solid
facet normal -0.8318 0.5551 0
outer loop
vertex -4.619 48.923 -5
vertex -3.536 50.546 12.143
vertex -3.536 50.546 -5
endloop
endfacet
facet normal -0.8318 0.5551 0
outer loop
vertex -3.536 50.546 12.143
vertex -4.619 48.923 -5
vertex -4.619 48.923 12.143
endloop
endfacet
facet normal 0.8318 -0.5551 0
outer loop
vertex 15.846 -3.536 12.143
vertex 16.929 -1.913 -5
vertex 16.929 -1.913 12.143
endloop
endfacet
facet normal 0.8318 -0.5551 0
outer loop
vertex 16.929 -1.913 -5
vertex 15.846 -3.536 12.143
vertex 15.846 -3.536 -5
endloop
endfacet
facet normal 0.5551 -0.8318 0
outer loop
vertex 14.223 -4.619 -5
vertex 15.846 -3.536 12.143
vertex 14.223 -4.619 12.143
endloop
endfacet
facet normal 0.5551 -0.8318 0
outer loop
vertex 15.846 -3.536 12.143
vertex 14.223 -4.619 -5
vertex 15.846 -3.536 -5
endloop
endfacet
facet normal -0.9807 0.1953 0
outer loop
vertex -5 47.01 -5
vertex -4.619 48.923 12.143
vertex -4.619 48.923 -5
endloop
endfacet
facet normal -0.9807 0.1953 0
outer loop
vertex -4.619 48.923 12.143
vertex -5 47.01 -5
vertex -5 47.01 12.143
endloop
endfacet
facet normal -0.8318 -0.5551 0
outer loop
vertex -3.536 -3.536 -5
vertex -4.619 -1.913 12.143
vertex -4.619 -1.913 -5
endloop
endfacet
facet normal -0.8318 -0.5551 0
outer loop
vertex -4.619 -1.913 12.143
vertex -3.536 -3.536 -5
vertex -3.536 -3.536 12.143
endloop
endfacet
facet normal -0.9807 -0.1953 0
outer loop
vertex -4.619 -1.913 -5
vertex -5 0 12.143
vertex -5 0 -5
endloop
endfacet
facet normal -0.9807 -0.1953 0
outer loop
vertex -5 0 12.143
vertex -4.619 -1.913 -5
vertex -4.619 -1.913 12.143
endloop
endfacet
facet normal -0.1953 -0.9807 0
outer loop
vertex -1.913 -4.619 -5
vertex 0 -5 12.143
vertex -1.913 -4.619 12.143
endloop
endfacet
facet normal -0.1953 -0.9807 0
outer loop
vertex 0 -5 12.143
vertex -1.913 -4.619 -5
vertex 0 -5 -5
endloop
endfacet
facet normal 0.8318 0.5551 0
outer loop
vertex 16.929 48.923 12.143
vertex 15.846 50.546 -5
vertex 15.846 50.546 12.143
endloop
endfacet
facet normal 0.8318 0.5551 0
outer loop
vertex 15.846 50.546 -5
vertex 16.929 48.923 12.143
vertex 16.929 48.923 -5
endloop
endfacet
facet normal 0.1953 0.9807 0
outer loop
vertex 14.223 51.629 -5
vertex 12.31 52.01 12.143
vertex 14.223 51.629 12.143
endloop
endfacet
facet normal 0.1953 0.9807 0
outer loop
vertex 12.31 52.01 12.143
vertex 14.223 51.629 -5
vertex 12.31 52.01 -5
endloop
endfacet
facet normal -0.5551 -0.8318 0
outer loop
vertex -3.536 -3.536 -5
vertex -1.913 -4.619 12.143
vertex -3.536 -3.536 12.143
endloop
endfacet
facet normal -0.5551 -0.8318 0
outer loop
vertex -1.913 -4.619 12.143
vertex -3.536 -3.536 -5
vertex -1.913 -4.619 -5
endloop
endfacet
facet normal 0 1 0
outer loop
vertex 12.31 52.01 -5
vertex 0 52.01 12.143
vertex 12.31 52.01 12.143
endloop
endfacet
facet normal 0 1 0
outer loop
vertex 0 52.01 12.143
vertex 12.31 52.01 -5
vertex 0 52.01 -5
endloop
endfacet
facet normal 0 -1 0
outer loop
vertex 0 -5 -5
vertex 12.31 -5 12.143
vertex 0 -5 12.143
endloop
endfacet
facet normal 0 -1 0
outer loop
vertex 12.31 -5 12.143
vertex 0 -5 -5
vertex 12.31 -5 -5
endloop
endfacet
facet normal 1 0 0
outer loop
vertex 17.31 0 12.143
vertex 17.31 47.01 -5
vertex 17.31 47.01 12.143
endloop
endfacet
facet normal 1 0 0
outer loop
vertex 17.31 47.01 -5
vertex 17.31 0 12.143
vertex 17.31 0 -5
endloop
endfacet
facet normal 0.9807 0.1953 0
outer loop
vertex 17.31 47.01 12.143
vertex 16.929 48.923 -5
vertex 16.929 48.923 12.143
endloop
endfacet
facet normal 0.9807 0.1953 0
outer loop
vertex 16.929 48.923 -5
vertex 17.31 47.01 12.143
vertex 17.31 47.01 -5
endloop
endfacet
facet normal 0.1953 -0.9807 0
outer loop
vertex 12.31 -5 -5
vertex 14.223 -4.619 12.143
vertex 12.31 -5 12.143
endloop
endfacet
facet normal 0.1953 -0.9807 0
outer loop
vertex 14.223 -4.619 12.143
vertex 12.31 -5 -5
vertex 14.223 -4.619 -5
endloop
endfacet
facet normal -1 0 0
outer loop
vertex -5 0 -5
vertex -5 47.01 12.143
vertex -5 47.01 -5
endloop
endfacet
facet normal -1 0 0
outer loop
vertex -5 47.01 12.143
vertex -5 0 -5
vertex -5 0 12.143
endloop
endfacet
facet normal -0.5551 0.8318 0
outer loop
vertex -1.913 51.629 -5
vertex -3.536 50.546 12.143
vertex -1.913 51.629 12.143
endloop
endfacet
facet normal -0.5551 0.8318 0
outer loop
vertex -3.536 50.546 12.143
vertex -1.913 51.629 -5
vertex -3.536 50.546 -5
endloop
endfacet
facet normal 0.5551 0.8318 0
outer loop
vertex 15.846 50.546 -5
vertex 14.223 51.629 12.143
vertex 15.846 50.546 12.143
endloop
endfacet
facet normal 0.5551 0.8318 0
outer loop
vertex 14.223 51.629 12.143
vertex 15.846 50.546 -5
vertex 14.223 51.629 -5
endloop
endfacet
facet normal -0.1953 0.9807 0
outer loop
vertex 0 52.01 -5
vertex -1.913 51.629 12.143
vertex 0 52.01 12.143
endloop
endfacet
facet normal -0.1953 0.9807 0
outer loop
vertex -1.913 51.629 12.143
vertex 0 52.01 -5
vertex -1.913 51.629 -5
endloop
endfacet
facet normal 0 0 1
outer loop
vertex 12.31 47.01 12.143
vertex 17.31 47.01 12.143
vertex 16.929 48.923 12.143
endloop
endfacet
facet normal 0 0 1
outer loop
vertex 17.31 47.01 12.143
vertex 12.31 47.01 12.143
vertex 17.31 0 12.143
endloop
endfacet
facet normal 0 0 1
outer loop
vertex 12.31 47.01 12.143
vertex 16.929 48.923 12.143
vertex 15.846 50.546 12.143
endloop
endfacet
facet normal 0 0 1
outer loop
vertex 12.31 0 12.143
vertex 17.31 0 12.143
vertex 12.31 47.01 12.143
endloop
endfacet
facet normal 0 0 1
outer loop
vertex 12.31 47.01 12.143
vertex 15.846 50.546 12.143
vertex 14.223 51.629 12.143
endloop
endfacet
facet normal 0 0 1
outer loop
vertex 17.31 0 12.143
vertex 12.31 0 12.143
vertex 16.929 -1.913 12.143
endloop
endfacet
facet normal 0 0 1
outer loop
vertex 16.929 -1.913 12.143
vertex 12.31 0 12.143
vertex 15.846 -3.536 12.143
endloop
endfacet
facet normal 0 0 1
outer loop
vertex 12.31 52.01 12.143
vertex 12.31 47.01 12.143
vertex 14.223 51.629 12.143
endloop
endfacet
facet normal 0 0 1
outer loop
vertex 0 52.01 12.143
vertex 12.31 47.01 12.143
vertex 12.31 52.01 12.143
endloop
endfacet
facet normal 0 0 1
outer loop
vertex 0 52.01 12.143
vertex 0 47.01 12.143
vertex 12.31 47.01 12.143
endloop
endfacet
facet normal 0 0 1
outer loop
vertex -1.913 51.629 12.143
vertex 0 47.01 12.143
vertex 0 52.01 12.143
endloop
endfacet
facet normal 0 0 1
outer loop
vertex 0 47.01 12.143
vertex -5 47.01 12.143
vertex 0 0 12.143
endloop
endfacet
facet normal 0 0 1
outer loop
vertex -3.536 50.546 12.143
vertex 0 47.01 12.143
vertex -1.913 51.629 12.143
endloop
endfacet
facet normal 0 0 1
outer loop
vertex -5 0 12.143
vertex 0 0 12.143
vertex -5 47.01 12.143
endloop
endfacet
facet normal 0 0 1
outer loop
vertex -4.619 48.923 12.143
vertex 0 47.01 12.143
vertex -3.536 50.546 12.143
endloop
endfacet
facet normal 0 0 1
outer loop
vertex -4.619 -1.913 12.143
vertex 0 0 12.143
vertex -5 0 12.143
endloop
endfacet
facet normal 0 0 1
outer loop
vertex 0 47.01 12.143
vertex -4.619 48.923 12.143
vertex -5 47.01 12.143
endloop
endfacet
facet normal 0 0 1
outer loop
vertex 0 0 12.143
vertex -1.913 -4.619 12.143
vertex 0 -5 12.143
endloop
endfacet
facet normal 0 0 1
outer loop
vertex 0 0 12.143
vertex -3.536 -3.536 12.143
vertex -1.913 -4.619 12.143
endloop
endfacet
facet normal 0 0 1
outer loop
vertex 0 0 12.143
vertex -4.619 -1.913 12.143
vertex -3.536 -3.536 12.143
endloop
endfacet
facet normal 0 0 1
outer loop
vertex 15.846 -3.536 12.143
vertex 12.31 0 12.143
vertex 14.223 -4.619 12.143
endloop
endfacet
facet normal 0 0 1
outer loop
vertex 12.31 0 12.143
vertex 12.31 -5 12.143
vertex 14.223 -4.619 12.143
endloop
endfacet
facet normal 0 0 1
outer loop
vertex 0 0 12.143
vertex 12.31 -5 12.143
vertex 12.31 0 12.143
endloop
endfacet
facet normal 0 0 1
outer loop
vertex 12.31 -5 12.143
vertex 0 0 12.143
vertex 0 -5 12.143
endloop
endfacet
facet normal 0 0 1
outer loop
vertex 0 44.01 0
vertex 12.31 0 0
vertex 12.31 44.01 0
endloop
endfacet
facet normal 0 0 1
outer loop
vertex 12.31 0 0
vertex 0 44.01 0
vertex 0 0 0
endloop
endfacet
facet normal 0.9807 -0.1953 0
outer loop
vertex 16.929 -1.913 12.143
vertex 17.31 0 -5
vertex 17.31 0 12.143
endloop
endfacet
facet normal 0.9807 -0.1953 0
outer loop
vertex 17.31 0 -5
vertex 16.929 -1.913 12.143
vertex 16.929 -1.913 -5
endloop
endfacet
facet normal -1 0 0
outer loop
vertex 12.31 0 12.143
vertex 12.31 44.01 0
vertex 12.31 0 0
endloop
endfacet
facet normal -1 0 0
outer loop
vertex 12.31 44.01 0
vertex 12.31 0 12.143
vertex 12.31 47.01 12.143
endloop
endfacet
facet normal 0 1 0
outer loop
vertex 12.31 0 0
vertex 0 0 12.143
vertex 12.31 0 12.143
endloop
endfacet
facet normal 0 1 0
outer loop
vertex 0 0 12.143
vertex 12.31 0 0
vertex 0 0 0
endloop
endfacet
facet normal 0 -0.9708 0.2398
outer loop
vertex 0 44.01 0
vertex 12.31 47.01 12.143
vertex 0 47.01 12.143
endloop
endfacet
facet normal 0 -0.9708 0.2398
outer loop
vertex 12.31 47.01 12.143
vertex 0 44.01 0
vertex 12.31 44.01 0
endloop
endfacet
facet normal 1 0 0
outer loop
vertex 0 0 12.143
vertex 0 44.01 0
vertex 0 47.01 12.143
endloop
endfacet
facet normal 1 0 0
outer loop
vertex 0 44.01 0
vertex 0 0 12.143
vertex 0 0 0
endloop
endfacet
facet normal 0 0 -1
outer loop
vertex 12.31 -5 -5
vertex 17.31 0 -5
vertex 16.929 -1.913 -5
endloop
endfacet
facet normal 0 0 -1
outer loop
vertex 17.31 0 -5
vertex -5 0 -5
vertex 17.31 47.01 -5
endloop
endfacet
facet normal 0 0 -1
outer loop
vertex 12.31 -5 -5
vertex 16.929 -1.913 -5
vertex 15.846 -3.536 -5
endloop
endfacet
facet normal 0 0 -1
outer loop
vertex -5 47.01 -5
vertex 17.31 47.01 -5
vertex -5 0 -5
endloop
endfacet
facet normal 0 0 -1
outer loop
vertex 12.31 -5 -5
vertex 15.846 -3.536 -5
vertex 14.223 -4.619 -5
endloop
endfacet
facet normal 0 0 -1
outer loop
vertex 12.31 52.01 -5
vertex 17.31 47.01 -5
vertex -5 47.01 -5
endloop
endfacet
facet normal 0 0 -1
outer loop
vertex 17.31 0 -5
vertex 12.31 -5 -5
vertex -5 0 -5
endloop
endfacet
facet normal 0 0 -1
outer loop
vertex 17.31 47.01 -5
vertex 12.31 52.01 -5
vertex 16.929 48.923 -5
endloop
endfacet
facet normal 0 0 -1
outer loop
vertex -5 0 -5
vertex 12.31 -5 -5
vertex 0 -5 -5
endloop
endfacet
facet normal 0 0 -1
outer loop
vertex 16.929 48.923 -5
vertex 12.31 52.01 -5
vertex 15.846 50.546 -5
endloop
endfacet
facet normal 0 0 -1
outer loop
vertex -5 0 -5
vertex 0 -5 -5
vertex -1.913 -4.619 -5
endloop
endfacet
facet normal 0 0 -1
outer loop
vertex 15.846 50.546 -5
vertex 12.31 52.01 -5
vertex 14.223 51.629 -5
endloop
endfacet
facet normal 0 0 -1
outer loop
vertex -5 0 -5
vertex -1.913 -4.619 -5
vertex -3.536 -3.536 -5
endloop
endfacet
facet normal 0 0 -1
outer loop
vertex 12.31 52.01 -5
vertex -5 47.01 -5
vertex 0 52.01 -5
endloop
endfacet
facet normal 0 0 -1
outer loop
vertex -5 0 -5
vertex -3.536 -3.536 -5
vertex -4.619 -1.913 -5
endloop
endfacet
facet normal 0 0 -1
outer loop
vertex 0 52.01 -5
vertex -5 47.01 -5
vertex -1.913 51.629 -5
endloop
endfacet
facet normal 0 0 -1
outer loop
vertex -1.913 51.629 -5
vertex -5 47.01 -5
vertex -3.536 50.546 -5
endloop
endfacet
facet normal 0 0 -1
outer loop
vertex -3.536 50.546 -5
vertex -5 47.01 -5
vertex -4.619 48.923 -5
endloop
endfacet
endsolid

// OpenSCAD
z = 12.14285714;

tol = 0.01;

x = 12.3;
y = 47;
thickness = 5;
bottomy = 44;

union() difference()
{
    linear_extrude(height = z)
    {
        offset(thickness) square([ x + tol, y + tol ]);
        //         square([ x + tol, y + tol ]);
    }
    hull()
    {
        translate([ 0, 0, z ]) linear_extrude(0.0001) square([ x + tol, y + tol ]);
        linear_extrude(0.00001) square([ x + tol, bottomy + tol ]);
    };
}
translate([ 0, 0, -thickness ])
{
    linear_extrude(height = thickness)
    {
        union()
        {
            offset(thickness) square([ x + tol, y + tol ]);
            square([ x + tol, y + tol ]);
        }
    }
}

// color("red")
// {
//     hull()
//     {
//         translate([ 0, 0, z ]) linear_extrude(0.0001) square([ x + tol, y + tol ]);
//         linear_extrude(0.00001) square([ x + tol, bottomy + tol ]);
//     }
// }
